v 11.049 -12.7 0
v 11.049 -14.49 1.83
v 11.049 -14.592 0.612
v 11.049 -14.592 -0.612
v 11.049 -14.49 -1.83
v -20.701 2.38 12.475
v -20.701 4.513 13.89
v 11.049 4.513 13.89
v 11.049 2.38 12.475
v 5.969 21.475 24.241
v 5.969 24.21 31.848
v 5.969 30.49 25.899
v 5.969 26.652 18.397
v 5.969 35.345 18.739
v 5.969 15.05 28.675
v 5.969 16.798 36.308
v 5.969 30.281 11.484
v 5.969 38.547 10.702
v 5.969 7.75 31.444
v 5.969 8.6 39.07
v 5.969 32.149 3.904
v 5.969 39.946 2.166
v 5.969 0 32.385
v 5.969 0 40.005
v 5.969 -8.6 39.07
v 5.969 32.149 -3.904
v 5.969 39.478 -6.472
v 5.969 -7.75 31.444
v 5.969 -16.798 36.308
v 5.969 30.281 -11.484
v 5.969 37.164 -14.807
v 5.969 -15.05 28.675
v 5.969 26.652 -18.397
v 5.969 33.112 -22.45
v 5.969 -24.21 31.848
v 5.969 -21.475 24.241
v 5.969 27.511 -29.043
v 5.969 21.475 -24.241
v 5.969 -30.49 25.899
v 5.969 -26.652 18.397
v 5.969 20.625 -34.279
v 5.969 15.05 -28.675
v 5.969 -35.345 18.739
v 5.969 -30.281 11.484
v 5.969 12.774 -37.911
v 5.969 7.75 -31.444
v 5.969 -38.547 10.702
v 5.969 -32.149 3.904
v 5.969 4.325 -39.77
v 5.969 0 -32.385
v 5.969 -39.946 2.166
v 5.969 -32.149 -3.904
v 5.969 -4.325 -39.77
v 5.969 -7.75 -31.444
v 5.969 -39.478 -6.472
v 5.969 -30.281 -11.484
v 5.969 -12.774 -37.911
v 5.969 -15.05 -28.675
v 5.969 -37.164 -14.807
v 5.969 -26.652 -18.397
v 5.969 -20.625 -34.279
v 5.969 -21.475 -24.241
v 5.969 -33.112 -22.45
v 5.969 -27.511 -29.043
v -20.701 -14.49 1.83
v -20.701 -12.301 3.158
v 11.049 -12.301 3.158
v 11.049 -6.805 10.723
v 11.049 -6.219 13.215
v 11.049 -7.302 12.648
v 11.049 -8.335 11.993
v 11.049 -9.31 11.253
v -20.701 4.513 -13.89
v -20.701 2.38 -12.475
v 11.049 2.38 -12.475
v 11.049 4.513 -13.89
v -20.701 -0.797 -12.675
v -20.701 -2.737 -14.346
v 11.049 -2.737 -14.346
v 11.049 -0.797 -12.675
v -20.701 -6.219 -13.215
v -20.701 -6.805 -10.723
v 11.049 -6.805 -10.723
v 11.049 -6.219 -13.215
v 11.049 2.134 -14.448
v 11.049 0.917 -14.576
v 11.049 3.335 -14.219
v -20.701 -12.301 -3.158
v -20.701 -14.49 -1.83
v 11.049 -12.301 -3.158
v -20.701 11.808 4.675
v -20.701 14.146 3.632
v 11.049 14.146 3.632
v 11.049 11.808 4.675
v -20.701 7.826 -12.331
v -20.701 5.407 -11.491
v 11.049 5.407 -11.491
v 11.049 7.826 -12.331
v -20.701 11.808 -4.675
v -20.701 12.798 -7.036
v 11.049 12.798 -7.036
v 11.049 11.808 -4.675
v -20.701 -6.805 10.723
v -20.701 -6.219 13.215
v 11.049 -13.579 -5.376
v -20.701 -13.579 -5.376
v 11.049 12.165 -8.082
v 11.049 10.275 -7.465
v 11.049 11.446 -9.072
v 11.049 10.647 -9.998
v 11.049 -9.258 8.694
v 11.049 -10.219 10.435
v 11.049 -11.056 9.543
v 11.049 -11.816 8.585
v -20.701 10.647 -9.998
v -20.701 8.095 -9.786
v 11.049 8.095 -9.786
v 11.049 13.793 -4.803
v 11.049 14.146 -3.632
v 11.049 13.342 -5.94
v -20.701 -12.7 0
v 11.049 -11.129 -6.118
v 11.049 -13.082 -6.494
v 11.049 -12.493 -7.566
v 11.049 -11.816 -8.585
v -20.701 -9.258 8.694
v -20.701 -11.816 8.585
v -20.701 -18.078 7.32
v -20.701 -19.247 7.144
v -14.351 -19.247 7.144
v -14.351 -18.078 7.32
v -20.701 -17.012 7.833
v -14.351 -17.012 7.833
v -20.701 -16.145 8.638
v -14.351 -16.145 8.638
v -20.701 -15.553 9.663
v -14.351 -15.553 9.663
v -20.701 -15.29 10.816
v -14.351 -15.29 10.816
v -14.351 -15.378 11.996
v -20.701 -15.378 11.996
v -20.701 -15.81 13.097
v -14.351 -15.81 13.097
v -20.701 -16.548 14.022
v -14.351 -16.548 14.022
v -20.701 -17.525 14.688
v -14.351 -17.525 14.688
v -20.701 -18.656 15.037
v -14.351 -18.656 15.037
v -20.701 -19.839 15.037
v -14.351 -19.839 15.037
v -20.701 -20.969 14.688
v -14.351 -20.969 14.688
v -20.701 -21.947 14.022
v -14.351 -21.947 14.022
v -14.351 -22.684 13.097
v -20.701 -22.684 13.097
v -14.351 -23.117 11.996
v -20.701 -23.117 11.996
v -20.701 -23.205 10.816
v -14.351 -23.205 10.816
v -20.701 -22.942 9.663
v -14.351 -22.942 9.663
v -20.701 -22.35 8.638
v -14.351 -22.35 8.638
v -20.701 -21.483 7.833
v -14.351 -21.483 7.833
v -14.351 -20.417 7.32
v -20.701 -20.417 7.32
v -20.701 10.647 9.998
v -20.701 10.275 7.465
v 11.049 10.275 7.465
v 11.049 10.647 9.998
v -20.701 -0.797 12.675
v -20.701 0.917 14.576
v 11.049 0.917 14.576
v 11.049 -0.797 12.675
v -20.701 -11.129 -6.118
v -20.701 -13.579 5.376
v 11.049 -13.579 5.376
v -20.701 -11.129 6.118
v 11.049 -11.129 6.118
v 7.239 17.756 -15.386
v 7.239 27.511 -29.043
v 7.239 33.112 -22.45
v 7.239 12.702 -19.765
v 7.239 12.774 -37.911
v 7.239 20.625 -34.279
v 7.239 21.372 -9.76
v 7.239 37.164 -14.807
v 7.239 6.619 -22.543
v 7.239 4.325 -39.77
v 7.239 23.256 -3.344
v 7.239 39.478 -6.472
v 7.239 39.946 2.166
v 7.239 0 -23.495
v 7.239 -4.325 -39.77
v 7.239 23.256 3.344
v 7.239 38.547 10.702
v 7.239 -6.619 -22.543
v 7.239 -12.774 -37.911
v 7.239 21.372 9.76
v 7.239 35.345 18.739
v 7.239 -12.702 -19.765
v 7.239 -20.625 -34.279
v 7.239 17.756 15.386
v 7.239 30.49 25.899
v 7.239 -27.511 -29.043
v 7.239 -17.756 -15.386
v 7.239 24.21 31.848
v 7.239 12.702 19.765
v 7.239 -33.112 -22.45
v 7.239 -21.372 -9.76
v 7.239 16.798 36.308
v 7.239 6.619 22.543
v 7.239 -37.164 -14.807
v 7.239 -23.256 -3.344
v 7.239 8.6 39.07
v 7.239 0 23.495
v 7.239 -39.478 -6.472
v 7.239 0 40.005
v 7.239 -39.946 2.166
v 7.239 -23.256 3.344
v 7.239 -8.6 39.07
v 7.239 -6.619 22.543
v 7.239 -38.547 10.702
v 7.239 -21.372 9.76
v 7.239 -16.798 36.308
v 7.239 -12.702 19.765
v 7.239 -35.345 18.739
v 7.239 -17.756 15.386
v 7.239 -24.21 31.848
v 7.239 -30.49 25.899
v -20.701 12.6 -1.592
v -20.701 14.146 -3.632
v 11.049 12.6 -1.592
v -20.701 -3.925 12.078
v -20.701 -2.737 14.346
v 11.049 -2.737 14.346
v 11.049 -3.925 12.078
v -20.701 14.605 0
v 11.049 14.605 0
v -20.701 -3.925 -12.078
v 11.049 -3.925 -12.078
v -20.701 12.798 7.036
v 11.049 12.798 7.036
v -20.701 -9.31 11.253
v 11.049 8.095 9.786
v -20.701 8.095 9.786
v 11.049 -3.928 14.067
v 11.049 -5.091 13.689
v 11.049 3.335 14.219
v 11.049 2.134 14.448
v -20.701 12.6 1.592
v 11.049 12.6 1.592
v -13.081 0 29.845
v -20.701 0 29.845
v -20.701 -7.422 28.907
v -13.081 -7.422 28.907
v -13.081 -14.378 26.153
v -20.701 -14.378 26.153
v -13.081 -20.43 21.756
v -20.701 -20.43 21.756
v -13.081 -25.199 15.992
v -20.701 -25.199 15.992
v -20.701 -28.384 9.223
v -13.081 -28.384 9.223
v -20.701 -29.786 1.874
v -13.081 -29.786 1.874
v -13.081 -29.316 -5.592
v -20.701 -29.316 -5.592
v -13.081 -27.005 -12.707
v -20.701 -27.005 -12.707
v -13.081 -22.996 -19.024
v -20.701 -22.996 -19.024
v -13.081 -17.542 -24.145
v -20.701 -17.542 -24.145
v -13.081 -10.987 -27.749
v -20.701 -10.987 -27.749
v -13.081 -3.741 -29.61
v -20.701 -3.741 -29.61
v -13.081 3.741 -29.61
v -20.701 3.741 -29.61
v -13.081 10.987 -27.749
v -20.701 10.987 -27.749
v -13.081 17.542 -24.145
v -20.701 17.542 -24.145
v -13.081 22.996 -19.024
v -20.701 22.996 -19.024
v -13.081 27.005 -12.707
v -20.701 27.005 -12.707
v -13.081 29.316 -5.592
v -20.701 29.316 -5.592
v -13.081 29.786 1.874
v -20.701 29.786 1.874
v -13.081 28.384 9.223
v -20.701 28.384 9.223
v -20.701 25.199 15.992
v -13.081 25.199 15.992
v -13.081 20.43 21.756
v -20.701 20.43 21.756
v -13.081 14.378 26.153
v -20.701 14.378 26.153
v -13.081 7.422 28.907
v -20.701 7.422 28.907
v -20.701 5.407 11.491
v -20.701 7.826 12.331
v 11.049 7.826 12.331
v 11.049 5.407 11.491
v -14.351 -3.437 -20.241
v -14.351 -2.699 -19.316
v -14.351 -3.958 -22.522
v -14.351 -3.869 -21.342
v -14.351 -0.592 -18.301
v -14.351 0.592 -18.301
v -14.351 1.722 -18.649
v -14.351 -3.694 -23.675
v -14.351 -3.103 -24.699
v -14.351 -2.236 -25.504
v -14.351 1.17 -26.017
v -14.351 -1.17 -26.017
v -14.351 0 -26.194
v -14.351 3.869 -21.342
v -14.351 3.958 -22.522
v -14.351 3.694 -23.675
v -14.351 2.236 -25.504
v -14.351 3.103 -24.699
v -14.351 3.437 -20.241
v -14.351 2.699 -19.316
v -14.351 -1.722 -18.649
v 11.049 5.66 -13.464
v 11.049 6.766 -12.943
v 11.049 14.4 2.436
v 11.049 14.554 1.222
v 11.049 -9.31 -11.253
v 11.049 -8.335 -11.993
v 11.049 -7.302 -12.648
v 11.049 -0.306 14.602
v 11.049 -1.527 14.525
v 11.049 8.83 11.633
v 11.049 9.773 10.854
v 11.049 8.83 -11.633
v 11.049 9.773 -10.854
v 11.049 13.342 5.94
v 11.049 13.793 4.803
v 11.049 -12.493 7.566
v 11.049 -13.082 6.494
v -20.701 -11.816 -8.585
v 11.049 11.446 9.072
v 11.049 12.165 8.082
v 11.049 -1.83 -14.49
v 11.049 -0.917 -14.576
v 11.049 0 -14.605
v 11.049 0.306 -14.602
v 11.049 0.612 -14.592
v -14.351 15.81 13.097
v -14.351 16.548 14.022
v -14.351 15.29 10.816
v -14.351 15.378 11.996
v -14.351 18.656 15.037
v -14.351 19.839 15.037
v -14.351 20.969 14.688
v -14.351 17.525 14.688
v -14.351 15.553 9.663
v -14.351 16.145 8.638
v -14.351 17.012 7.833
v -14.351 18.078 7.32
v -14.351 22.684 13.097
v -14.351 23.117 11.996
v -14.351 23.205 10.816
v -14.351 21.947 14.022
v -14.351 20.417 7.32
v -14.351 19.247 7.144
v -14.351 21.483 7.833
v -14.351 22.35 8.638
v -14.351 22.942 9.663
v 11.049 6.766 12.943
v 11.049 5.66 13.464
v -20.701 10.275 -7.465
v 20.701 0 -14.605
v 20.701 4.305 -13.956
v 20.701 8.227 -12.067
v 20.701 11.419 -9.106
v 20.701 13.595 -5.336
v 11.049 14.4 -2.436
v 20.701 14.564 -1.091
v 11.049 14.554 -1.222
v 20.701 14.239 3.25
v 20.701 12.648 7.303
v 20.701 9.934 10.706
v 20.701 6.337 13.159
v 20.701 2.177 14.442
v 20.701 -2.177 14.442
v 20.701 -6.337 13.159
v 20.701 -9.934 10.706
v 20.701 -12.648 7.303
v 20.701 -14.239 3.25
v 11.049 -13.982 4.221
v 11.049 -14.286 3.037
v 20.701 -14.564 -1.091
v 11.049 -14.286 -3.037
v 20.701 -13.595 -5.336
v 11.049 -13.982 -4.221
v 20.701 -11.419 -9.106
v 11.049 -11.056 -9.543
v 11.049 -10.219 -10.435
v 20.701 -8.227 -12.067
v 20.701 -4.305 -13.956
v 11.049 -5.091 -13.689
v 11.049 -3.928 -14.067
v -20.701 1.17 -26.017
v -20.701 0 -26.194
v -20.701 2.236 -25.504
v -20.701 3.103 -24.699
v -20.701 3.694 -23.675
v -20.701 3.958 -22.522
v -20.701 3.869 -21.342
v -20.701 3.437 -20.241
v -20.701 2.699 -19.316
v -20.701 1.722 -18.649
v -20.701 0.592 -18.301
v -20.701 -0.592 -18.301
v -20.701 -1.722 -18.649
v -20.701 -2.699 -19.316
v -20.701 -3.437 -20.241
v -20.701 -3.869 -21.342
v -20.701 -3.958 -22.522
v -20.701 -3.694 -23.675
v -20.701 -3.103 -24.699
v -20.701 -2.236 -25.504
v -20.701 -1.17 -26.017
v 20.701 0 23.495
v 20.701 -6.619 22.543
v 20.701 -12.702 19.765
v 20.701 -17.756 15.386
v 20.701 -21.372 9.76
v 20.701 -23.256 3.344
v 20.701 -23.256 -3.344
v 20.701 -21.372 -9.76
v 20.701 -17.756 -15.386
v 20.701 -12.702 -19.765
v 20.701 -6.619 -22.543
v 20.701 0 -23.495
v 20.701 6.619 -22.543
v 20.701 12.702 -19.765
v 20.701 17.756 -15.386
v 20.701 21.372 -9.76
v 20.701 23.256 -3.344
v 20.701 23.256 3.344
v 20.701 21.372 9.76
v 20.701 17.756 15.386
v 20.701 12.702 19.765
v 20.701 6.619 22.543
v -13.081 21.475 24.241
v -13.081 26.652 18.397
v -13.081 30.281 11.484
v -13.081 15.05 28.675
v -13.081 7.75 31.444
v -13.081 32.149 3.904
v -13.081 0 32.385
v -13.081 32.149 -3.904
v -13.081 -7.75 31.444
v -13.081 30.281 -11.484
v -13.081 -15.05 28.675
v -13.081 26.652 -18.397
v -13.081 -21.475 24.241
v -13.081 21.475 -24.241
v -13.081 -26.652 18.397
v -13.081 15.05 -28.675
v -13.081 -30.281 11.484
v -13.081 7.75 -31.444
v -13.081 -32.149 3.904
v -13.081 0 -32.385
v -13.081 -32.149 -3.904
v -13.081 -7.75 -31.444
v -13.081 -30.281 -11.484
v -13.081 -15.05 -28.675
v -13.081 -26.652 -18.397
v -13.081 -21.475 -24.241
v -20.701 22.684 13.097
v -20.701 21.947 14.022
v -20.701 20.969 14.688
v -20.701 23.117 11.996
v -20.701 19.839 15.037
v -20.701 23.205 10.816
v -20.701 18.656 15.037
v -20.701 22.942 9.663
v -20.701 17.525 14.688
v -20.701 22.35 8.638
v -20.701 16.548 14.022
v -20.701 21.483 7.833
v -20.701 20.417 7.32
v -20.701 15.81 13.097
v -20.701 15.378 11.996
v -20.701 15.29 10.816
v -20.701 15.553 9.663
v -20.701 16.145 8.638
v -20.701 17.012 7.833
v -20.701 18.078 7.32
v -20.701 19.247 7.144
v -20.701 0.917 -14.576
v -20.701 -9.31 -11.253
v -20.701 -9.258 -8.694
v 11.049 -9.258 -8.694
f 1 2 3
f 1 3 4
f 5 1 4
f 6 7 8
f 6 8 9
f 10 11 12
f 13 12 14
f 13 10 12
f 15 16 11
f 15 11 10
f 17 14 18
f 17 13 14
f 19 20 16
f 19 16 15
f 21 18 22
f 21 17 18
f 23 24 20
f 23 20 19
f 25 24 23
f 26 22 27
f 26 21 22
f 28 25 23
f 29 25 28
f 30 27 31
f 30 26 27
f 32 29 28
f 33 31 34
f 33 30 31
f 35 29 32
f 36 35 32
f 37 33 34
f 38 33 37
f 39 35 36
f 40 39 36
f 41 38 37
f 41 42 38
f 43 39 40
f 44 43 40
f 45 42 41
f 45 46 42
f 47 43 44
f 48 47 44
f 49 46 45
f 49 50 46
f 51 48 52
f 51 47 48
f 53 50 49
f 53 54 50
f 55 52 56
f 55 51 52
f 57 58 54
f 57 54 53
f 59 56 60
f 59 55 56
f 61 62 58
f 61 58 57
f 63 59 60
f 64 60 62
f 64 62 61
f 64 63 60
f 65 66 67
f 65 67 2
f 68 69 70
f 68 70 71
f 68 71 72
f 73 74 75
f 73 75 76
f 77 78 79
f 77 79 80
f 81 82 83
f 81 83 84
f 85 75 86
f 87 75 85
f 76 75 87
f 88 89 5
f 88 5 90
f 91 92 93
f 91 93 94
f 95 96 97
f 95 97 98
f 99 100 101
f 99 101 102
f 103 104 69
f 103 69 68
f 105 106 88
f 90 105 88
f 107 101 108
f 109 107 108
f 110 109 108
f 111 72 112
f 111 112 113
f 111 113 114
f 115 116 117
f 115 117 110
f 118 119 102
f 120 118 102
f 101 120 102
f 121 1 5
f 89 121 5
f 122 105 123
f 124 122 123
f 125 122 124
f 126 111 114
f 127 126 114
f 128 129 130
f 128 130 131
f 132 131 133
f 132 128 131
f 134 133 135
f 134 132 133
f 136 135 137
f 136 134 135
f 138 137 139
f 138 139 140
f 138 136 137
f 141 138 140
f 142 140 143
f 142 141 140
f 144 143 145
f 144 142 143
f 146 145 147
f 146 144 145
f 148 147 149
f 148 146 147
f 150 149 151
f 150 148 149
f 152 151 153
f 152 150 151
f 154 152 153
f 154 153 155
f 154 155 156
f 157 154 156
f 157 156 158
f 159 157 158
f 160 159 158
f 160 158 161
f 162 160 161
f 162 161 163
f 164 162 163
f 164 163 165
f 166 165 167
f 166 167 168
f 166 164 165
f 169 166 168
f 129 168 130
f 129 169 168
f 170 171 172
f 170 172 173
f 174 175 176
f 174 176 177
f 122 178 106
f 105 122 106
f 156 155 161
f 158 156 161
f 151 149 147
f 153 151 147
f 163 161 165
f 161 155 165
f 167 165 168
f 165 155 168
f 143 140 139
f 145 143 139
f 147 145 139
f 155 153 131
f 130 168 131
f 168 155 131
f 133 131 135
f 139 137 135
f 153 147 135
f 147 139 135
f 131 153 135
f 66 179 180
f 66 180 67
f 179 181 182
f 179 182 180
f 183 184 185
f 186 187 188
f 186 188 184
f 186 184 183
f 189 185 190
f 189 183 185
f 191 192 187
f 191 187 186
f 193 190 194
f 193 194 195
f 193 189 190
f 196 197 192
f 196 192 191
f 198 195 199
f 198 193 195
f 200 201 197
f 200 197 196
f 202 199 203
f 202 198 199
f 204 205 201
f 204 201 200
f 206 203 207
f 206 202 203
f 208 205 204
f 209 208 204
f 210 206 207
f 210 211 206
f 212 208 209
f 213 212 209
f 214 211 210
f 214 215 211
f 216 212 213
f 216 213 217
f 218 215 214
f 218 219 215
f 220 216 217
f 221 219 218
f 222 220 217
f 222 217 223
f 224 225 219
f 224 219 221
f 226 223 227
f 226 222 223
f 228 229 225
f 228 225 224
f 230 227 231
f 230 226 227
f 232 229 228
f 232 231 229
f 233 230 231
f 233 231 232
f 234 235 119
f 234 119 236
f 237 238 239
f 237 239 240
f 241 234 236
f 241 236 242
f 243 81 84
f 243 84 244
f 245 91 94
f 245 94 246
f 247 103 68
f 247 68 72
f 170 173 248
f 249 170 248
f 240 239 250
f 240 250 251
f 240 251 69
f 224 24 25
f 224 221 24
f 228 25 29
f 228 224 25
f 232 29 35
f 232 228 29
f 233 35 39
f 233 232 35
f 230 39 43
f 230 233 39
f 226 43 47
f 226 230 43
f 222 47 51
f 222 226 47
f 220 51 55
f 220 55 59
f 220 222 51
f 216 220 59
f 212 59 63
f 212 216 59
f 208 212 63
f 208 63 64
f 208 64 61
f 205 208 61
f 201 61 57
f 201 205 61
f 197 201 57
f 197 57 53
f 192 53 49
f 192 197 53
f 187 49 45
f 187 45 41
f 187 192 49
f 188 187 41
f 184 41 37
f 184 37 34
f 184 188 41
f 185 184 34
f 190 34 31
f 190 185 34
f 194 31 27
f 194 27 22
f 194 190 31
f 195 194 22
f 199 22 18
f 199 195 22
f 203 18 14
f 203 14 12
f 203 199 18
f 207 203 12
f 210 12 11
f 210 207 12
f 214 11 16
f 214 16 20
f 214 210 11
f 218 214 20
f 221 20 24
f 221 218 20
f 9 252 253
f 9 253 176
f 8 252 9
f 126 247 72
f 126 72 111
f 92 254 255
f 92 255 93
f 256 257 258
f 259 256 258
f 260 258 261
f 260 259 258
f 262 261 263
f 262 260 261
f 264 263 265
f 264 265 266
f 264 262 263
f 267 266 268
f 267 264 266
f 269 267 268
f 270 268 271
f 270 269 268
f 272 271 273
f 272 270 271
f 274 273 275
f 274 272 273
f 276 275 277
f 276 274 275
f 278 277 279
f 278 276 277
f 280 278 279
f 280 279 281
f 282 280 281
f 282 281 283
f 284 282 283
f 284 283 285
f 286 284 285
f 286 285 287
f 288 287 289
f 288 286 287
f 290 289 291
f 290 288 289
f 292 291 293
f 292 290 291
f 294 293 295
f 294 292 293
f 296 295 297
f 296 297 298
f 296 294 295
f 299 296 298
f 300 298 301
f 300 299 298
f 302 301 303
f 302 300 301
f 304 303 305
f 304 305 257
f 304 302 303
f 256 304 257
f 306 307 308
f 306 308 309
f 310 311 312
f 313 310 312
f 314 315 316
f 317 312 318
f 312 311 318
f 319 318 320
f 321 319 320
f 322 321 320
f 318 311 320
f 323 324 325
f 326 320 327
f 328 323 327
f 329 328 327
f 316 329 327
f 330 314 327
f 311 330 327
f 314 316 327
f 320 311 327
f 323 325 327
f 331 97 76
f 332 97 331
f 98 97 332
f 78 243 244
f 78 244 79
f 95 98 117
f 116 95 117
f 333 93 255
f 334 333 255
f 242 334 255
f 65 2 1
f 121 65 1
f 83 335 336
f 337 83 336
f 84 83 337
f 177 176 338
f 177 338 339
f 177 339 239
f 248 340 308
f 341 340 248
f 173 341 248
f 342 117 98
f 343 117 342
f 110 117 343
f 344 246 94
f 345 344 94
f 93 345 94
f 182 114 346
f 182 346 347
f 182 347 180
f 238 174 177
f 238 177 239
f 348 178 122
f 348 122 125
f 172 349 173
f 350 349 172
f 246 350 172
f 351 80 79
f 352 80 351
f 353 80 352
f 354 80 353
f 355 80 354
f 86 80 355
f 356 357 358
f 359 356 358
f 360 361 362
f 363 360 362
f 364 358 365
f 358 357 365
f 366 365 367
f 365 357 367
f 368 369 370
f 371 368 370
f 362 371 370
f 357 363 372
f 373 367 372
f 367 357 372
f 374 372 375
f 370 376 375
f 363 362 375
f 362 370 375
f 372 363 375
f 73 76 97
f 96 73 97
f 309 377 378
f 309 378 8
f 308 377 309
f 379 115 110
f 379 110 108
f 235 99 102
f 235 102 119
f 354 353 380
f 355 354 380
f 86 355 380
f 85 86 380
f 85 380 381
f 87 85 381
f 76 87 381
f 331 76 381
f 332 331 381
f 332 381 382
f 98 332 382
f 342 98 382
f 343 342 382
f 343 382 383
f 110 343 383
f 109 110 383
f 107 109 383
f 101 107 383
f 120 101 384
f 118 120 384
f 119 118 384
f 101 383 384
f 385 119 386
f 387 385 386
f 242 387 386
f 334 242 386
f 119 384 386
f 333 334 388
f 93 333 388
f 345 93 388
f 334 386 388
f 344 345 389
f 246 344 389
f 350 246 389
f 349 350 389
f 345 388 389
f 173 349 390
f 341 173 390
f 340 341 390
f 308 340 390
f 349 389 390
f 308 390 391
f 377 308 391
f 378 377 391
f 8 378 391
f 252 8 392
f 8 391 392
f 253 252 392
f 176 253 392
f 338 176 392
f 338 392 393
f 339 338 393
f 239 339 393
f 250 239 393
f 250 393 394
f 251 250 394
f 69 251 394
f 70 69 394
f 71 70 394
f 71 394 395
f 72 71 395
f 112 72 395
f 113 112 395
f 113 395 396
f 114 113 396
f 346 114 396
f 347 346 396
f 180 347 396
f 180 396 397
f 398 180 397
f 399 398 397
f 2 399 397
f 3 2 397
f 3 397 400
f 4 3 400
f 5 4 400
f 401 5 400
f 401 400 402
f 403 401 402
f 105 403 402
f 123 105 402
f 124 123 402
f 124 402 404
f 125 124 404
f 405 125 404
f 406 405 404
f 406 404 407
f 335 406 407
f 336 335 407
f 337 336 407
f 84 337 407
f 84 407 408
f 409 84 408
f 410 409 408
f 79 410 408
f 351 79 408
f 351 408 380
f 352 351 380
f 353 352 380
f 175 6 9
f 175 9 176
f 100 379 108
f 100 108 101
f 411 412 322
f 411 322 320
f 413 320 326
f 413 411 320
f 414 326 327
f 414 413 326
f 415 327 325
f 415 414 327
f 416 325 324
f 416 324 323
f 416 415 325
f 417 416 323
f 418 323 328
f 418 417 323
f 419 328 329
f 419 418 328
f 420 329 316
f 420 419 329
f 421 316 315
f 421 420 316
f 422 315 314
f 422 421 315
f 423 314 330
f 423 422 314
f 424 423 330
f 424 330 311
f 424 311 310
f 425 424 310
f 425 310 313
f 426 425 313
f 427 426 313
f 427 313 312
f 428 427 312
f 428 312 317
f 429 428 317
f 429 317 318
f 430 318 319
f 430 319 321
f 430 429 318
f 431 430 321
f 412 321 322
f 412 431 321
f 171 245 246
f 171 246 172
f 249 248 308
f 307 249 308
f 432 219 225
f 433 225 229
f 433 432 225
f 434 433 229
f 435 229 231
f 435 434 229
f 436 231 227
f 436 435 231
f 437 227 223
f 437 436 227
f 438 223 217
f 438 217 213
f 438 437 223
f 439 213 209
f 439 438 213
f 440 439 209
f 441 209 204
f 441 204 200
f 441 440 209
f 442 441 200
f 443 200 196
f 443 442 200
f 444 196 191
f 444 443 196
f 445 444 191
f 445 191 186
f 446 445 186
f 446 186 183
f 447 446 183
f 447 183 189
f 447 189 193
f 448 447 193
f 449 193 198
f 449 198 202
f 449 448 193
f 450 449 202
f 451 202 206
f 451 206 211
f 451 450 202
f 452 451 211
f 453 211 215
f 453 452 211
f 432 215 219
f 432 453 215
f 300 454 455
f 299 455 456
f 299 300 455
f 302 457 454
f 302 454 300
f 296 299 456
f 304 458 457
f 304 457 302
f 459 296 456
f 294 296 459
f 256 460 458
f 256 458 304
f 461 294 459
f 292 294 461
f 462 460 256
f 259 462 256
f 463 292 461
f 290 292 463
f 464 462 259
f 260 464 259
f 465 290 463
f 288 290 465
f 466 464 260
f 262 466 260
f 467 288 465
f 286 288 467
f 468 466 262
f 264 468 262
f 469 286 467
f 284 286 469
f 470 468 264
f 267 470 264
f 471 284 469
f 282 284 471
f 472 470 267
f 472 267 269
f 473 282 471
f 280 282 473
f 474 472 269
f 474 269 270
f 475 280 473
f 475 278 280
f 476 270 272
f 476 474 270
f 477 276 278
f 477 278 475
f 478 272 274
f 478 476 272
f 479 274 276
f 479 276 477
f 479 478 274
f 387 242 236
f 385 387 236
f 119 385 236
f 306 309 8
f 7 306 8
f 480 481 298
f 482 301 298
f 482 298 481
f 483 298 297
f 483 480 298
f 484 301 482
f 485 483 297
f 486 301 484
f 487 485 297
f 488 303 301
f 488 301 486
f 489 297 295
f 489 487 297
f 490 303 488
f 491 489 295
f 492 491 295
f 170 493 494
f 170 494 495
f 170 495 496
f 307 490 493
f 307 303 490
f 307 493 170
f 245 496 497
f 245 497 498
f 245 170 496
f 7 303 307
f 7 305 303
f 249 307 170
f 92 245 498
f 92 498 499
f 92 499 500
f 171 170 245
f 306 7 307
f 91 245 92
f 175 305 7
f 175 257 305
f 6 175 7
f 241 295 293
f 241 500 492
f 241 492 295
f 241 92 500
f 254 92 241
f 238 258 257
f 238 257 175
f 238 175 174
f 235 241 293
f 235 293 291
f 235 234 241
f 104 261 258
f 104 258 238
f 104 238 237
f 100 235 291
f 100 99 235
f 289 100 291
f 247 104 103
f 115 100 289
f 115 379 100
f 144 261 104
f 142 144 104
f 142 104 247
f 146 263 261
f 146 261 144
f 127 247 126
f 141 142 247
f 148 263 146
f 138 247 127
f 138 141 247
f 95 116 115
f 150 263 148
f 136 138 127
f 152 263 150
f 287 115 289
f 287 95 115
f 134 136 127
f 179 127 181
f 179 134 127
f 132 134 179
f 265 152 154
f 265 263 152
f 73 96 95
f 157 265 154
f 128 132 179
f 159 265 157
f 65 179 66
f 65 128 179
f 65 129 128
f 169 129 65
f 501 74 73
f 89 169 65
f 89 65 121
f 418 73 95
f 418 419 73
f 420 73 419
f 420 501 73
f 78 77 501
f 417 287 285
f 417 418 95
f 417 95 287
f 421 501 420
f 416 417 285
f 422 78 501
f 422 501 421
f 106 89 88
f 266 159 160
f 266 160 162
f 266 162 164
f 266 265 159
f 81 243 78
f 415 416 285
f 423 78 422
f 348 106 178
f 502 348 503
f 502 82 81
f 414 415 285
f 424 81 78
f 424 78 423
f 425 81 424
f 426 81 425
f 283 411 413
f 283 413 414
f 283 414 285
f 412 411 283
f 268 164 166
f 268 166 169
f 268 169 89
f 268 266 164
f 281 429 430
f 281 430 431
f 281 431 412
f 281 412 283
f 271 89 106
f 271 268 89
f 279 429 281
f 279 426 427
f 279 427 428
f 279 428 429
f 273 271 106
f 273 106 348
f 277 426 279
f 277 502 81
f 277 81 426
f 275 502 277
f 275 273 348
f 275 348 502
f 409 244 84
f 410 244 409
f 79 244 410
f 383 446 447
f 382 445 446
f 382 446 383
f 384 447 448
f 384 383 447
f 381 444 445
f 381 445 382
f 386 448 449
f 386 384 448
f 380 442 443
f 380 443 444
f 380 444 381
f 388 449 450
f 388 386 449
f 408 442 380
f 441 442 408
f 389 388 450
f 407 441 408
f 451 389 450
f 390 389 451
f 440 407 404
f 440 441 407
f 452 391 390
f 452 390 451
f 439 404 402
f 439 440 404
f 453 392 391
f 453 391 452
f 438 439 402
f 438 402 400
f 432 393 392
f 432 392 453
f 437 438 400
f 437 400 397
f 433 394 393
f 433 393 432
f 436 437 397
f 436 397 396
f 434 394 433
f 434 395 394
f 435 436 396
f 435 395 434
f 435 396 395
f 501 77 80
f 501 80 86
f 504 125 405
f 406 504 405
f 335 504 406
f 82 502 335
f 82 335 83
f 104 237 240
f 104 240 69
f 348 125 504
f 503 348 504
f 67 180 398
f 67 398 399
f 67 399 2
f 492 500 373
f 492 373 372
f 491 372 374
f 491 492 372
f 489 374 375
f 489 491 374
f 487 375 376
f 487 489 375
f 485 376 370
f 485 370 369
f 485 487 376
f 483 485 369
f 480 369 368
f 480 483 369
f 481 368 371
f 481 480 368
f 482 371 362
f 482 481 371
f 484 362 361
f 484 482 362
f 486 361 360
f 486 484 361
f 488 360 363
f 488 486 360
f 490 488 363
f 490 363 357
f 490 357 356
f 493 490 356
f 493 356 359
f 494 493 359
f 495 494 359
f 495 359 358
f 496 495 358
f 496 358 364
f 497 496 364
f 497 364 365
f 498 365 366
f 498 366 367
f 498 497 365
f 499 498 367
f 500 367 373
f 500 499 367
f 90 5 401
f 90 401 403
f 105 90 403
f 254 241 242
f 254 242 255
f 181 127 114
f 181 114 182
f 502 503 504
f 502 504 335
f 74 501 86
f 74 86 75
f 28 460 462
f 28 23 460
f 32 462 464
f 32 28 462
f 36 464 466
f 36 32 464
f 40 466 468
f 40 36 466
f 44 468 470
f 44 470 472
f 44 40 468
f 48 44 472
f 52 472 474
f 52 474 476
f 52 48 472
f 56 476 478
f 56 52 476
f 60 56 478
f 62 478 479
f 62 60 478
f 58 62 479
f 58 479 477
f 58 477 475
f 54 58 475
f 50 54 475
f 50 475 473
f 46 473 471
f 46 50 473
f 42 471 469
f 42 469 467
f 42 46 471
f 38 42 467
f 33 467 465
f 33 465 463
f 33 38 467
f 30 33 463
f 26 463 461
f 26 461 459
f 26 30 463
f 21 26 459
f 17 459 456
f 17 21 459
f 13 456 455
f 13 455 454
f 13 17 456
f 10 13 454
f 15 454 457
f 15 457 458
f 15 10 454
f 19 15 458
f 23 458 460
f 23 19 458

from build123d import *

# Parameters (mm, degrees)
SKETCH2_R          = 3.96875
CUT_EXTRUDE1_DEPTH = 6.35
CUT_EXTRUDE2_START = -41.402
CUT_EXTRUDE2_DEPTH = 31.75
SKETCH3_4_R        = 14.605
CUT_EXTRUDE3_DEPTH = 9.652


with BuildPart() as part:
    # Sketch1 → Revolve1 (revolve)
    with BuildSketch(Plane(origin=(0, 0, 0), x_dir=(1, 0, 0), z_dir=(0, 1, 0))):
        Polygon((-20.701, -12.7), (-20.701, -29.845), (-13.081, -29.845), (-13.081, -32.385), (5.969, -32.385), (5.969, -40.005), (7.239, -40.005), (7.239, -23.495), (20.701, -23.495), (20.701, -12.7), align=None)
    revolve(axis=Axis((-34.012862719, 0, 0), (1, 0, 0)))

    # Sketch2 → Cut-Extrude1 (cut)
    with BuildSketch(Plane(origin=(-20.701, 0, 0), x_dir=(0, 0, -1), z_dir=(1, 0, 0))):
        with Locations((22.225, 0)):
            Circle(SKETCH2_R)
        with Locations((-11.1125, -19.247414599)):
            Circle(SKETCH2_R)
        with Locations((-11.1125, 19.247414599)):
            Circle(SKETCH2_R)
    extrude(amount=CUT_EXTRUDE1_DEPTH, mode=Mode.SUBTRACT)

    # Sketch3 → Cut-Extrude2 (cut)
    with BuildSketch(Plane(origin=(20.701, 0, 0), x_dir=(0, 0, -1), z_dir=(1, 0, 0)).offset(CUT_EXTRUDE2_START)):
        with BuildLine():
            Line((-13.214999101, -6.218506553), (-10.722964654, -6.805000296))
            ThreePointArc((-10.722964654, -6.805000296), (-11.491303566, -5.407397003), (-12.078417757, -3.924515829))
            Line((-12.078417757, -3.924515829), (-13.214999101, -6.218506553))
        make_face()
        with BuildLine():
            Line((-14.346305297, -2.7367041), (-12.078417757, -3.924515829))
            ThreePointArc((-12.078417757, -3.924515829), (-12.475048084, -2.379742695), (-12.674939451, -0.797439598))
            Line((-12.674939451, -0.797439598), (-14.346305297, -2.7367041))
        make_face()
        with BuildLine():
            Line((-14.576180369, 0.917055538), (-12.674939451, -0.797439598))
            ThreePointArc((-12.674939451, -0.797439598), (-12.674939451, 0.797439598), (-12.475048084, 2.379742695))
            Line((-12.475048084, 2.379742695), (-14.576180369, 0.917055538))
        make_face()
        with BuildLine():
            Line((-13.89018042, 4.513193203), (-12.475048084, 2.379742695))
            ThreePointArc((-12.475048084, 2.379742695), (-12.078417757, 3.924515829), (-11.491303566, 5.407397003))
            Line((-11.491303566, 5.407397003), (-13.89018042, 4.513193203))
        make_face()
        with BuildLine():
            Line((-12.331409352, 7.825750341), (-11.491303566, 5.407397003))
            ThreePointArc((-11.491303566, 5.407397003), (-10.722964654, 6.805000296), (-9.785518183, 8.09528467))
            Line((-9.785518183, 8.09528467), (-12.331409352, 7.825750341))
        make_face()
        with BuildLine():
            Line((-9.997810482, 10.646586803), (-9.785518183, 8.09528467))
            ThreePointArc((-9.785518183, 8.09528467), (-8.693748245, 9.257901568), (-7.464872704, 10.274515829))
            Line((-7.464872704, 10.274515829), (-9.997810482, 10.646586803))
        make_face()
        with BuildLine():
            Line((-7.03601241, 12.798459062), (-7.464872704, 10.274515829))
            ThreePointArc((-7.464872704, 10.274515829), (-6.118271661, 11.129094837), (-4.675181819, 11.808161371))
            Line((-4.675181819, 11.808161371), (-7.03601241, 12.798459062))
        make_face()
        with BuildLine():
            Line((-3.632115802, 14.146157068), (-4.675181819, 11.808161371))
            ThreePointArc((-4.675181819, 11.808161371), (-3.158361567, 12.301006146), (-1.591732066, 12.599856707))
            Line((-1.591732066, 12.599856707), (-3.632115802, 14.146157068))
        make_face()
        with BuildLine():
            ThreePointArc((-1.591732066, 12.599856707), (0, 12.7), (1.591732066, 12.599856707))
            Line((1.591732066, 12.599856707), (0, 14.605))
            Line((0, 14.605), (-1.591732066, 12.599856707))
        make_face()
        with BuildLine():
            ThreePointArc((1.591732066, 12.599856707), (3.158361567, 12.301006146), (4.675181819, 11.808161371))
            Line((4.675181819, 11.808161371), (3.632115802, 14.146157068))
            Line((3.632115802, 14.146157068), (1.591732066, 12.599856707))
        make_face()
        with BuildLine():
            ThreePointArc((4.675181819, 11.808161371), (6.118271661, 11.129094837), (7.464872704, 10.274515829))
            Line((7.464872704, 10.274515829), (7.03601241, 12.798459062))
            Line((7.03601241, 12.798459062), (4.675181819, 11.808161371))
        make_face()
        with BuildLine():
            ThreePointArc((7.464872704, 10.274515829), (8.693748245, 9.257901568), (9.785518183, 8.09528467))
            Line((9.785518183, 8.09528467), (9.997810482, 10.646586803))
            Line((9.997810482, 10.646586803), (7.464872704, 10.274515829))
        make_face()
        with BuildLine():
            ThreePointArc((9.785518183, 8.09528467), (10.722964654, 6.805000296), (11.491303566, 5.407397003))
            Line((11.491303566, 5.407397003), (12.331409352, 7.825750341))
            Line((12.331409352, 7.825750341), (9.785518183, 8.09528467))
        make_face()
        with BuildLine():
            ThreePointArc((11.491303566, 5.407397003), (12.078417757, 3.924515829), (12.475048084, 2.379742695))
            Line((12.475048084, 2.379742695), (13.89018042, 4.513193203))
            Line((13.89018042, 4.513193203), (11.491303566, 5.407397003))
        make_face()
        with BuildLine():
            ThreePointArc((12.7, 0), (12.693733317, -0.39891664), (12.674939451, -0.797439598))
            Line((12.674939451, -0.797439598), (14.576180369, 0.917055538))
            Line((14.576180369, 0.917055538), (12.475048084, 2.379742695))
            ThreePointArc((12.475048084, 2.379742695), (12.64363695, 1.195175579), (12.7, 0))
        make_face()
        with BuildLine():
            ThreePointArc((12.674939451, -0.797439598), (12.475048084, -2.379742695), (12.078417757, -3.924515829))
            Line((12.078417757, -3.924515829), (14.346305297, -2.7367041))
            Line((14.346305297, -2.7367041), (12.674939451, -0.797439598))
        make_face()
        with BuildLine():
            ThreePointArc((12.078417757, -3.924515829), (11.491303566, -5.407397003), (10.722964654, -6.805000296))
            Line((10.722964654, -6.805000296), (13.214999101, -6.218506553))
            Line((13.214999101, -6.218506553), (12.078417757, -3.924515829))
        make_face()
        with BuildLine():
            ThreePointArc((10.722964654, -6.805000296), (9.785518183, -8.09528467), (8.693748245, -9.257901568))
            Line((8.693748245, -9.257901568), (11.253345911, -9.30957737))
            Line((11.253345911, -9.30957737), (10.722964654, -6.805000296))
        make_face()
        with BuildLine():
            ThreePointArc((8.693748245, -9.257901568), (7.464872704, -10.274515829), (6.118271661, -11.129094837))
            Line((6.118271661, -11.129094837), (8.58460361, -11.815693203))
            Line((8.58460361, -11.815693203), (8.693748245, -9.257901568))
        make_face()
        with BuildLine():
            Line((1.830491876, -14.489835213), (3.158361567, -12.301006146))
            ThreePointArc((3.158361567, -12.301006146), (1.591732066, -12.599856707), (0, -12.7))
            Line((0, -12.7), (1.830491876, -14.489835213))
        make_face()
        with BuildLine():
            Line((-1.830491876, -14.489835213), (0, -12.7))
            ThreePointArc((0, -12.7), (-1.591732066, -12.599856707), (-3.158361567, -12.301006146))
            Line((-3.158361567, -12.301006146), (-1.830491876, -14.489835213))
        make_face()
        with BuildLine():
            Line((-5.376459092, -13.579385576), (-3.158361567, -12.301006146))
            ThreePointArc((-3.158361567, -12.301006146), (-4.675181819, -11.808161371), (-6.118271661, -11.129094837))
            Line((-6.118271661, -11.129094837), (-5.376459092, -13.579385576))
        make_face()
        with BuildLine():
            Line((-8.58460361, -11.815693203), (-6.118271661, -11.129094837))
            ThreePointArc((-6.118271661, -11.129094837), (-7.464872704, -10.274515829), (-8.693748245, -9.257901568))
            Line((-8.693748245, -9.257901568), (-8.58460361, -11.815693203))
        make_face()
        with BuildLine():
            Line((-11.253345911, -9.30957737), (-8.693748245, -9.257901568))
            ThreePointArc((-8.693748245, -9.257901568), (-9.785518183, -8.09528467), (-10.722964654, -6.805000296))
            Line((-10.722964654, -6.805000296), (-11.253345911, -9.30957737))
        make_face()
        with BuildLine():
            Line((6.118271661, -11.129094837), (5.376459092, -13.579385576))
            Line((5.376459092, -13.579385576), (3.158361567, -12.301006146))
            ThreePointArc((3.158361567, -12.301006146), (4.675181819, -11.808161371), (6.118271661, -11.129094837))
        make_face()
    extrude(amount=CUT_EXTRUDE2_DEPTH, mode=Mode.SUBTRACT)

    # Sketch3<4> → Cut-Extrude3 (cut)
    with BuildSketch(Plane(origin=(20.701, 0, 0), x_dir=(0, 0, -1), z_dir=(1, 0, 0))):
        Circle(SKETCH3_4_R)
    extrude(amount=-CUT_EXTRUDE3_DEPTH, mode=Mode.SUBTRACT)


solid = part.part
